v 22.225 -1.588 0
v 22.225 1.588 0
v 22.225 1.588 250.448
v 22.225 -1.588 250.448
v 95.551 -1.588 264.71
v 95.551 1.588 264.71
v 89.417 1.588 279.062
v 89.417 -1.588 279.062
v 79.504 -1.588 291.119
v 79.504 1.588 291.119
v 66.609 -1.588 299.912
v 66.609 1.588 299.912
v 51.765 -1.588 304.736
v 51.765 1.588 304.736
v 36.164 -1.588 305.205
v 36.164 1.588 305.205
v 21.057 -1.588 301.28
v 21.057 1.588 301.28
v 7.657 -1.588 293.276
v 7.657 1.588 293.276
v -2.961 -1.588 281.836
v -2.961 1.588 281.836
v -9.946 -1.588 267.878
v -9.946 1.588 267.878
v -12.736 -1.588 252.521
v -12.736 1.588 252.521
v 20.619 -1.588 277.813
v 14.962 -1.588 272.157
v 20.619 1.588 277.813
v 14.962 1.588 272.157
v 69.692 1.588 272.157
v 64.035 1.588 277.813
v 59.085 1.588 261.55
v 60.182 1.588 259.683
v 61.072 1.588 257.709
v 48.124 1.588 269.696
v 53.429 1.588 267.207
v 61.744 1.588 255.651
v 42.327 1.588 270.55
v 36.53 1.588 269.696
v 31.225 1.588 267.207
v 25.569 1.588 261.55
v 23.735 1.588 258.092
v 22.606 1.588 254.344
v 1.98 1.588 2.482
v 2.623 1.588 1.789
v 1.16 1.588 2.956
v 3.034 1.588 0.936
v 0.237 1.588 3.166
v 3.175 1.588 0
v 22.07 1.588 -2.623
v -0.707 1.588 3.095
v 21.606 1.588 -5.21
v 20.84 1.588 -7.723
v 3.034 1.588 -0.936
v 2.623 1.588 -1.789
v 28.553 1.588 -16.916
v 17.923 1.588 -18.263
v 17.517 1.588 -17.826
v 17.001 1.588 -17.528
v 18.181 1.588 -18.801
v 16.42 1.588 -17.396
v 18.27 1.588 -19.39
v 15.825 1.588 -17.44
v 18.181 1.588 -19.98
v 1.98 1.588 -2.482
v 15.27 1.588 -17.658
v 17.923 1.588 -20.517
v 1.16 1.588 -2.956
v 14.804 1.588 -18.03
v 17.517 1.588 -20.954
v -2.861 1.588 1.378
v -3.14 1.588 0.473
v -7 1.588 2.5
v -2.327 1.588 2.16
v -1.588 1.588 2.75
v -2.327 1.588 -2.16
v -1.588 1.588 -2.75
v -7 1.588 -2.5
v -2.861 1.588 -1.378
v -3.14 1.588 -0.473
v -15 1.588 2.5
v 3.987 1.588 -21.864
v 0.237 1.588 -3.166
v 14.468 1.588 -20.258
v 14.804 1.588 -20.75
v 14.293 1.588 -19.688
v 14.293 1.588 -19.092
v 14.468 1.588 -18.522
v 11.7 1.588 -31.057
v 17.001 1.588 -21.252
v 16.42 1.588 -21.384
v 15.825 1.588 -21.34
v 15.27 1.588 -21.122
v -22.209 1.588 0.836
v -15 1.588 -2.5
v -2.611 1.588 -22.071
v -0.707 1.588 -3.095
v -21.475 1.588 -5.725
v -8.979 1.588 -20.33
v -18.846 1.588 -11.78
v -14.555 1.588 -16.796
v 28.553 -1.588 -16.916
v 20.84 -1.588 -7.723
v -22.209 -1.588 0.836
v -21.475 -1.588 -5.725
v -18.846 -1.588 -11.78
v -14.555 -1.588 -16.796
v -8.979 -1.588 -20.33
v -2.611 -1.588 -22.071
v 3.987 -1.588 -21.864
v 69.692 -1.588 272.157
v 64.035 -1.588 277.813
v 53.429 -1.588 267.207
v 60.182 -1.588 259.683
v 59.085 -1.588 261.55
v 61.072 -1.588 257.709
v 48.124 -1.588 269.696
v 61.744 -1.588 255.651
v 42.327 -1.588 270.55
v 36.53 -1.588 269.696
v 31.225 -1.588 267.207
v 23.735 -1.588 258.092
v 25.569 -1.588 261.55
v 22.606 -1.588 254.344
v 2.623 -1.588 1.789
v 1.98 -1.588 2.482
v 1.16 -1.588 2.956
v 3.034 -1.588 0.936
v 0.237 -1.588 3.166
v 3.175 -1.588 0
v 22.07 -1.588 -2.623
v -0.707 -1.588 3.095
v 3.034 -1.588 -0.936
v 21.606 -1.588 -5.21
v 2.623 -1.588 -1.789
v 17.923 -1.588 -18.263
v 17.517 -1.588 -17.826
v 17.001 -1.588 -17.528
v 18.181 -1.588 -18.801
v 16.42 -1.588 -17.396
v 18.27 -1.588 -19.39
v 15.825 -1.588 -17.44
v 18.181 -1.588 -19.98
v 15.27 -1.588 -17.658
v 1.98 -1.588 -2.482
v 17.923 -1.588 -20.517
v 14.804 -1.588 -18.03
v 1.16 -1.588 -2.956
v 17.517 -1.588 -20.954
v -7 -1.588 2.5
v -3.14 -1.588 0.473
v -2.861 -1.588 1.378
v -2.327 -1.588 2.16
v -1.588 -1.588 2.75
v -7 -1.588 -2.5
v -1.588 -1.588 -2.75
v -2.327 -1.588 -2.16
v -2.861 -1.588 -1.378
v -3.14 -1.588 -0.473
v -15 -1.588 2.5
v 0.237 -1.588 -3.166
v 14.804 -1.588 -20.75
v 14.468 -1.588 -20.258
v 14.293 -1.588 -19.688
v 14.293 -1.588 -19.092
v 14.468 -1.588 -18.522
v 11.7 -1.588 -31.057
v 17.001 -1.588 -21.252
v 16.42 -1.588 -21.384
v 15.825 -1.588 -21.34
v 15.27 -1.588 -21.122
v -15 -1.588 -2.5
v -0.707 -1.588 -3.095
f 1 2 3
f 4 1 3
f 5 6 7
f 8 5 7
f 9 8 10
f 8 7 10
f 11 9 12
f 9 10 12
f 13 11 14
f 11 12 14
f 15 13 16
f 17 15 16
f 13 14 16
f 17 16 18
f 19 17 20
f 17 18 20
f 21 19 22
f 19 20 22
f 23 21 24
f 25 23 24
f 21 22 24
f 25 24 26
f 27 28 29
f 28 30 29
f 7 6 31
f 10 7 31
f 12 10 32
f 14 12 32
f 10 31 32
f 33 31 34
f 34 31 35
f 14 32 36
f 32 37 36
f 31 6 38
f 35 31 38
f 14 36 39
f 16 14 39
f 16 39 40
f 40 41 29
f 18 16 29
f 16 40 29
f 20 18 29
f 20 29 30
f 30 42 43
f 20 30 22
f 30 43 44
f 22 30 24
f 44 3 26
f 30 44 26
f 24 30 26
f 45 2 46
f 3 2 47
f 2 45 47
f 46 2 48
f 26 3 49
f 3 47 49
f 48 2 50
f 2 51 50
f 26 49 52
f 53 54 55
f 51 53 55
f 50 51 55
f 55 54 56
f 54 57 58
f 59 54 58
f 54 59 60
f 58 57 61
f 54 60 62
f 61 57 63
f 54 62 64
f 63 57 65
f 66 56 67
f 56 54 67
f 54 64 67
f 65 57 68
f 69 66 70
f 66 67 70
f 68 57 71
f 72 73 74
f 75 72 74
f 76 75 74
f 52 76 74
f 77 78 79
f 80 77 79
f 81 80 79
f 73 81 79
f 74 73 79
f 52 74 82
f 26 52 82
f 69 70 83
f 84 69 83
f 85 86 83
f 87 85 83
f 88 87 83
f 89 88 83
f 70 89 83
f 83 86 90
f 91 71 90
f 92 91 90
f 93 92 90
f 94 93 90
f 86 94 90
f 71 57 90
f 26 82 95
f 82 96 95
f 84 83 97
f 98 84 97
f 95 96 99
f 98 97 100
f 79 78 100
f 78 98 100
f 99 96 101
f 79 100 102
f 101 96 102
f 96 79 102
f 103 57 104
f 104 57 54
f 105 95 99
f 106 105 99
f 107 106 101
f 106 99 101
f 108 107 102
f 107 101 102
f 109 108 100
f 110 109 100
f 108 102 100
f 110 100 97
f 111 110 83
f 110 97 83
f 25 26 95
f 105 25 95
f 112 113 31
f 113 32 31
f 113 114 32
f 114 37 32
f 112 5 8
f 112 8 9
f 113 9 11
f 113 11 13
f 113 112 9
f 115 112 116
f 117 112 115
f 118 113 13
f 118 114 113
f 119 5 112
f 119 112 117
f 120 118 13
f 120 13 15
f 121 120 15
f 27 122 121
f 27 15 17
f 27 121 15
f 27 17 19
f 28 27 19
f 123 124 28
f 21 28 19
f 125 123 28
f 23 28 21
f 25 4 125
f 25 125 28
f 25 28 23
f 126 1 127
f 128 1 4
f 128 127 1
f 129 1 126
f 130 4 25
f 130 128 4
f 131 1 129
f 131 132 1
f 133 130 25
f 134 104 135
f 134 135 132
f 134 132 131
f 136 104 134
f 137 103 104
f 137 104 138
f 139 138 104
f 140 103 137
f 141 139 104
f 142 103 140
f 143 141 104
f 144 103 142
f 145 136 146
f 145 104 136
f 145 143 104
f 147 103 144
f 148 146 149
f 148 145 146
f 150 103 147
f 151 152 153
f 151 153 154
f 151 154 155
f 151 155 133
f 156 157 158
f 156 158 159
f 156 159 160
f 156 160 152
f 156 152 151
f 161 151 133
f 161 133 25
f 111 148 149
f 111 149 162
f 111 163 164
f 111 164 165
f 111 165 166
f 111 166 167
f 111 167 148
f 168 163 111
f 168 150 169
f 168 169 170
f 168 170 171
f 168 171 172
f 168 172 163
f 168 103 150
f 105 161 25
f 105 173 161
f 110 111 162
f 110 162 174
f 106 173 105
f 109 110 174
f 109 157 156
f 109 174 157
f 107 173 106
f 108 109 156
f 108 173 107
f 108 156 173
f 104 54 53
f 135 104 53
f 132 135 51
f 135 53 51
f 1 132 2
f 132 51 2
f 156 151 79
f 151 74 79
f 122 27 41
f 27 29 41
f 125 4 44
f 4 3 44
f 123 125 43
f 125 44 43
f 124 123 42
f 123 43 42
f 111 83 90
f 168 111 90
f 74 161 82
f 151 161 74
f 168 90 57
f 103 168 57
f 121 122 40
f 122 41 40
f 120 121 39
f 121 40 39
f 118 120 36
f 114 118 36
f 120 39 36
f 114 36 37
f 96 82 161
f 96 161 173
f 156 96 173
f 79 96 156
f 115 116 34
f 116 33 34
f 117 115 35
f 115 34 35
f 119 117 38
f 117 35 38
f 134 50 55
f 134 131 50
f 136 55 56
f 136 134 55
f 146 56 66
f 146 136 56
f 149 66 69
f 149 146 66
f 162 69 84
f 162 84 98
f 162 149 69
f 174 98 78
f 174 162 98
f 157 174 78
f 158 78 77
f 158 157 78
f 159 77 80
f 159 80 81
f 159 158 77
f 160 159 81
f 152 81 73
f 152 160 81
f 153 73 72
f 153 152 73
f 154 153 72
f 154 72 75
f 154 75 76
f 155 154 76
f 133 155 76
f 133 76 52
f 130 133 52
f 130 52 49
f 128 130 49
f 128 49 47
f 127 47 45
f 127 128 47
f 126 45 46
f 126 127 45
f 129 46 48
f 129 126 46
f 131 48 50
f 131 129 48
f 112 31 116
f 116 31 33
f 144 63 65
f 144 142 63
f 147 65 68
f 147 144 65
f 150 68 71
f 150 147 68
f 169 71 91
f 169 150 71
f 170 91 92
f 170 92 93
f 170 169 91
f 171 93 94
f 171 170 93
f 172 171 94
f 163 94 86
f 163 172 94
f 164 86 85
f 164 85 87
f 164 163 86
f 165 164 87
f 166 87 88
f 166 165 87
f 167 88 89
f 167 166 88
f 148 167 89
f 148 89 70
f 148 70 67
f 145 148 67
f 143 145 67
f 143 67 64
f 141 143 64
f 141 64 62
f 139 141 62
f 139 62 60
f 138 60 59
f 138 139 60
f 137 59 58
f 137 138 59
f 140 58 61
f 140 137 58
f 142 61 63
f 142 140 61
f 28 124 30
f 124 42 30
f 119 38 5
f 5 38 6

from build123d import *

# Parameters (mm, degrees)
SKETCH1_R           = 3.175
SKETCH1_R_2         = 2
SKETCH1_W           = 8
SKETCH1_H           = 5
BOSS_EXTRUDE1_DEPTH = 1.5875


with BuildPart() as part:
    # Sketch1 → Boss-Extrude1 (new body, symmetric)
    with BuildSketch(Plane(origin=(0, 0, 0), x_dir=(1, 0, 0), z_dir=(0, 1, 0))):
        with BuildLine():
            Line((22.225, 0), (22.225, -250.448449629))
            ThreePointArc((22.225, -250.448449629), (23.079031542, -256.245526228), (25.568559237, -261.550026094))
            Line((25.568559237, -261.550026094), (14.961957519, -272.156627812))
            Line((14.961957519, -272.156627812), (20.618811769, -277.813482061))
            Line((20.618811769, -277.813482061), (31.225413487, -267.206880343))
            ThreePointArc((31.225413487, -267.206880343), (42.326989951, -270.55043958), (53.428566416, -267.206880343))
            Line((53.428566416, -267.206880343), (64.035168134, -277.813482061))
            Line((64.035168134, -277.813482061), (69.692022383, -272.156627812))
            Line((69.692022383, -272.156627812), (59.085420665, -261.550026094))
            ThreePointArc((59.085420665, -261.550026094), (60.653609073, -258.708294153), (61.744021205, -255.651227473))
            Line((61.744021205, -255.651227473), (95.551425125, -264.709894052))
            ThreePointArc((95.551425125, -264.709894052), (36.163593878, -305.204653346), (-12.736009339, -252.520985708))
            Line((-12.736009339, -252.520985708), (-22.209273391, -0.835942847))
            ThreePointArc((-22.209273391, -0.835942847), (-14.554726567, 16.796147164), (3.986980194, 21.864460065))
            Line((3.986980194, 21.864460065), (11.70043151, 31.056993382))
            Line((11.70043151, 31.056993382), (28.553409259, 16.915665969))
            Line((28.553409259, 16.915665969), (20.839957942, 7.723132652))
            ThreePointArc((20.839957942, 7.723132652), (21.875999295, 3.923172169), (22.225, 0))
        make_face()
        Circle(SKETCH1_R, mode=Mode.SUBTRACT)
        with Locations((16.270194726, 19.390063017)):
            Circle(SKETCH1_R_2, mode=Mode.SUBTRACT)
        with Locations((-11, 0)):
            Rectangle(SKETCH1_W, SKETCH1_H, mode=Mode.SUBTRACT)
    extrude(amount=BOSS_EXTRUDE1_DEPTH, both=True)


solid = part.part
